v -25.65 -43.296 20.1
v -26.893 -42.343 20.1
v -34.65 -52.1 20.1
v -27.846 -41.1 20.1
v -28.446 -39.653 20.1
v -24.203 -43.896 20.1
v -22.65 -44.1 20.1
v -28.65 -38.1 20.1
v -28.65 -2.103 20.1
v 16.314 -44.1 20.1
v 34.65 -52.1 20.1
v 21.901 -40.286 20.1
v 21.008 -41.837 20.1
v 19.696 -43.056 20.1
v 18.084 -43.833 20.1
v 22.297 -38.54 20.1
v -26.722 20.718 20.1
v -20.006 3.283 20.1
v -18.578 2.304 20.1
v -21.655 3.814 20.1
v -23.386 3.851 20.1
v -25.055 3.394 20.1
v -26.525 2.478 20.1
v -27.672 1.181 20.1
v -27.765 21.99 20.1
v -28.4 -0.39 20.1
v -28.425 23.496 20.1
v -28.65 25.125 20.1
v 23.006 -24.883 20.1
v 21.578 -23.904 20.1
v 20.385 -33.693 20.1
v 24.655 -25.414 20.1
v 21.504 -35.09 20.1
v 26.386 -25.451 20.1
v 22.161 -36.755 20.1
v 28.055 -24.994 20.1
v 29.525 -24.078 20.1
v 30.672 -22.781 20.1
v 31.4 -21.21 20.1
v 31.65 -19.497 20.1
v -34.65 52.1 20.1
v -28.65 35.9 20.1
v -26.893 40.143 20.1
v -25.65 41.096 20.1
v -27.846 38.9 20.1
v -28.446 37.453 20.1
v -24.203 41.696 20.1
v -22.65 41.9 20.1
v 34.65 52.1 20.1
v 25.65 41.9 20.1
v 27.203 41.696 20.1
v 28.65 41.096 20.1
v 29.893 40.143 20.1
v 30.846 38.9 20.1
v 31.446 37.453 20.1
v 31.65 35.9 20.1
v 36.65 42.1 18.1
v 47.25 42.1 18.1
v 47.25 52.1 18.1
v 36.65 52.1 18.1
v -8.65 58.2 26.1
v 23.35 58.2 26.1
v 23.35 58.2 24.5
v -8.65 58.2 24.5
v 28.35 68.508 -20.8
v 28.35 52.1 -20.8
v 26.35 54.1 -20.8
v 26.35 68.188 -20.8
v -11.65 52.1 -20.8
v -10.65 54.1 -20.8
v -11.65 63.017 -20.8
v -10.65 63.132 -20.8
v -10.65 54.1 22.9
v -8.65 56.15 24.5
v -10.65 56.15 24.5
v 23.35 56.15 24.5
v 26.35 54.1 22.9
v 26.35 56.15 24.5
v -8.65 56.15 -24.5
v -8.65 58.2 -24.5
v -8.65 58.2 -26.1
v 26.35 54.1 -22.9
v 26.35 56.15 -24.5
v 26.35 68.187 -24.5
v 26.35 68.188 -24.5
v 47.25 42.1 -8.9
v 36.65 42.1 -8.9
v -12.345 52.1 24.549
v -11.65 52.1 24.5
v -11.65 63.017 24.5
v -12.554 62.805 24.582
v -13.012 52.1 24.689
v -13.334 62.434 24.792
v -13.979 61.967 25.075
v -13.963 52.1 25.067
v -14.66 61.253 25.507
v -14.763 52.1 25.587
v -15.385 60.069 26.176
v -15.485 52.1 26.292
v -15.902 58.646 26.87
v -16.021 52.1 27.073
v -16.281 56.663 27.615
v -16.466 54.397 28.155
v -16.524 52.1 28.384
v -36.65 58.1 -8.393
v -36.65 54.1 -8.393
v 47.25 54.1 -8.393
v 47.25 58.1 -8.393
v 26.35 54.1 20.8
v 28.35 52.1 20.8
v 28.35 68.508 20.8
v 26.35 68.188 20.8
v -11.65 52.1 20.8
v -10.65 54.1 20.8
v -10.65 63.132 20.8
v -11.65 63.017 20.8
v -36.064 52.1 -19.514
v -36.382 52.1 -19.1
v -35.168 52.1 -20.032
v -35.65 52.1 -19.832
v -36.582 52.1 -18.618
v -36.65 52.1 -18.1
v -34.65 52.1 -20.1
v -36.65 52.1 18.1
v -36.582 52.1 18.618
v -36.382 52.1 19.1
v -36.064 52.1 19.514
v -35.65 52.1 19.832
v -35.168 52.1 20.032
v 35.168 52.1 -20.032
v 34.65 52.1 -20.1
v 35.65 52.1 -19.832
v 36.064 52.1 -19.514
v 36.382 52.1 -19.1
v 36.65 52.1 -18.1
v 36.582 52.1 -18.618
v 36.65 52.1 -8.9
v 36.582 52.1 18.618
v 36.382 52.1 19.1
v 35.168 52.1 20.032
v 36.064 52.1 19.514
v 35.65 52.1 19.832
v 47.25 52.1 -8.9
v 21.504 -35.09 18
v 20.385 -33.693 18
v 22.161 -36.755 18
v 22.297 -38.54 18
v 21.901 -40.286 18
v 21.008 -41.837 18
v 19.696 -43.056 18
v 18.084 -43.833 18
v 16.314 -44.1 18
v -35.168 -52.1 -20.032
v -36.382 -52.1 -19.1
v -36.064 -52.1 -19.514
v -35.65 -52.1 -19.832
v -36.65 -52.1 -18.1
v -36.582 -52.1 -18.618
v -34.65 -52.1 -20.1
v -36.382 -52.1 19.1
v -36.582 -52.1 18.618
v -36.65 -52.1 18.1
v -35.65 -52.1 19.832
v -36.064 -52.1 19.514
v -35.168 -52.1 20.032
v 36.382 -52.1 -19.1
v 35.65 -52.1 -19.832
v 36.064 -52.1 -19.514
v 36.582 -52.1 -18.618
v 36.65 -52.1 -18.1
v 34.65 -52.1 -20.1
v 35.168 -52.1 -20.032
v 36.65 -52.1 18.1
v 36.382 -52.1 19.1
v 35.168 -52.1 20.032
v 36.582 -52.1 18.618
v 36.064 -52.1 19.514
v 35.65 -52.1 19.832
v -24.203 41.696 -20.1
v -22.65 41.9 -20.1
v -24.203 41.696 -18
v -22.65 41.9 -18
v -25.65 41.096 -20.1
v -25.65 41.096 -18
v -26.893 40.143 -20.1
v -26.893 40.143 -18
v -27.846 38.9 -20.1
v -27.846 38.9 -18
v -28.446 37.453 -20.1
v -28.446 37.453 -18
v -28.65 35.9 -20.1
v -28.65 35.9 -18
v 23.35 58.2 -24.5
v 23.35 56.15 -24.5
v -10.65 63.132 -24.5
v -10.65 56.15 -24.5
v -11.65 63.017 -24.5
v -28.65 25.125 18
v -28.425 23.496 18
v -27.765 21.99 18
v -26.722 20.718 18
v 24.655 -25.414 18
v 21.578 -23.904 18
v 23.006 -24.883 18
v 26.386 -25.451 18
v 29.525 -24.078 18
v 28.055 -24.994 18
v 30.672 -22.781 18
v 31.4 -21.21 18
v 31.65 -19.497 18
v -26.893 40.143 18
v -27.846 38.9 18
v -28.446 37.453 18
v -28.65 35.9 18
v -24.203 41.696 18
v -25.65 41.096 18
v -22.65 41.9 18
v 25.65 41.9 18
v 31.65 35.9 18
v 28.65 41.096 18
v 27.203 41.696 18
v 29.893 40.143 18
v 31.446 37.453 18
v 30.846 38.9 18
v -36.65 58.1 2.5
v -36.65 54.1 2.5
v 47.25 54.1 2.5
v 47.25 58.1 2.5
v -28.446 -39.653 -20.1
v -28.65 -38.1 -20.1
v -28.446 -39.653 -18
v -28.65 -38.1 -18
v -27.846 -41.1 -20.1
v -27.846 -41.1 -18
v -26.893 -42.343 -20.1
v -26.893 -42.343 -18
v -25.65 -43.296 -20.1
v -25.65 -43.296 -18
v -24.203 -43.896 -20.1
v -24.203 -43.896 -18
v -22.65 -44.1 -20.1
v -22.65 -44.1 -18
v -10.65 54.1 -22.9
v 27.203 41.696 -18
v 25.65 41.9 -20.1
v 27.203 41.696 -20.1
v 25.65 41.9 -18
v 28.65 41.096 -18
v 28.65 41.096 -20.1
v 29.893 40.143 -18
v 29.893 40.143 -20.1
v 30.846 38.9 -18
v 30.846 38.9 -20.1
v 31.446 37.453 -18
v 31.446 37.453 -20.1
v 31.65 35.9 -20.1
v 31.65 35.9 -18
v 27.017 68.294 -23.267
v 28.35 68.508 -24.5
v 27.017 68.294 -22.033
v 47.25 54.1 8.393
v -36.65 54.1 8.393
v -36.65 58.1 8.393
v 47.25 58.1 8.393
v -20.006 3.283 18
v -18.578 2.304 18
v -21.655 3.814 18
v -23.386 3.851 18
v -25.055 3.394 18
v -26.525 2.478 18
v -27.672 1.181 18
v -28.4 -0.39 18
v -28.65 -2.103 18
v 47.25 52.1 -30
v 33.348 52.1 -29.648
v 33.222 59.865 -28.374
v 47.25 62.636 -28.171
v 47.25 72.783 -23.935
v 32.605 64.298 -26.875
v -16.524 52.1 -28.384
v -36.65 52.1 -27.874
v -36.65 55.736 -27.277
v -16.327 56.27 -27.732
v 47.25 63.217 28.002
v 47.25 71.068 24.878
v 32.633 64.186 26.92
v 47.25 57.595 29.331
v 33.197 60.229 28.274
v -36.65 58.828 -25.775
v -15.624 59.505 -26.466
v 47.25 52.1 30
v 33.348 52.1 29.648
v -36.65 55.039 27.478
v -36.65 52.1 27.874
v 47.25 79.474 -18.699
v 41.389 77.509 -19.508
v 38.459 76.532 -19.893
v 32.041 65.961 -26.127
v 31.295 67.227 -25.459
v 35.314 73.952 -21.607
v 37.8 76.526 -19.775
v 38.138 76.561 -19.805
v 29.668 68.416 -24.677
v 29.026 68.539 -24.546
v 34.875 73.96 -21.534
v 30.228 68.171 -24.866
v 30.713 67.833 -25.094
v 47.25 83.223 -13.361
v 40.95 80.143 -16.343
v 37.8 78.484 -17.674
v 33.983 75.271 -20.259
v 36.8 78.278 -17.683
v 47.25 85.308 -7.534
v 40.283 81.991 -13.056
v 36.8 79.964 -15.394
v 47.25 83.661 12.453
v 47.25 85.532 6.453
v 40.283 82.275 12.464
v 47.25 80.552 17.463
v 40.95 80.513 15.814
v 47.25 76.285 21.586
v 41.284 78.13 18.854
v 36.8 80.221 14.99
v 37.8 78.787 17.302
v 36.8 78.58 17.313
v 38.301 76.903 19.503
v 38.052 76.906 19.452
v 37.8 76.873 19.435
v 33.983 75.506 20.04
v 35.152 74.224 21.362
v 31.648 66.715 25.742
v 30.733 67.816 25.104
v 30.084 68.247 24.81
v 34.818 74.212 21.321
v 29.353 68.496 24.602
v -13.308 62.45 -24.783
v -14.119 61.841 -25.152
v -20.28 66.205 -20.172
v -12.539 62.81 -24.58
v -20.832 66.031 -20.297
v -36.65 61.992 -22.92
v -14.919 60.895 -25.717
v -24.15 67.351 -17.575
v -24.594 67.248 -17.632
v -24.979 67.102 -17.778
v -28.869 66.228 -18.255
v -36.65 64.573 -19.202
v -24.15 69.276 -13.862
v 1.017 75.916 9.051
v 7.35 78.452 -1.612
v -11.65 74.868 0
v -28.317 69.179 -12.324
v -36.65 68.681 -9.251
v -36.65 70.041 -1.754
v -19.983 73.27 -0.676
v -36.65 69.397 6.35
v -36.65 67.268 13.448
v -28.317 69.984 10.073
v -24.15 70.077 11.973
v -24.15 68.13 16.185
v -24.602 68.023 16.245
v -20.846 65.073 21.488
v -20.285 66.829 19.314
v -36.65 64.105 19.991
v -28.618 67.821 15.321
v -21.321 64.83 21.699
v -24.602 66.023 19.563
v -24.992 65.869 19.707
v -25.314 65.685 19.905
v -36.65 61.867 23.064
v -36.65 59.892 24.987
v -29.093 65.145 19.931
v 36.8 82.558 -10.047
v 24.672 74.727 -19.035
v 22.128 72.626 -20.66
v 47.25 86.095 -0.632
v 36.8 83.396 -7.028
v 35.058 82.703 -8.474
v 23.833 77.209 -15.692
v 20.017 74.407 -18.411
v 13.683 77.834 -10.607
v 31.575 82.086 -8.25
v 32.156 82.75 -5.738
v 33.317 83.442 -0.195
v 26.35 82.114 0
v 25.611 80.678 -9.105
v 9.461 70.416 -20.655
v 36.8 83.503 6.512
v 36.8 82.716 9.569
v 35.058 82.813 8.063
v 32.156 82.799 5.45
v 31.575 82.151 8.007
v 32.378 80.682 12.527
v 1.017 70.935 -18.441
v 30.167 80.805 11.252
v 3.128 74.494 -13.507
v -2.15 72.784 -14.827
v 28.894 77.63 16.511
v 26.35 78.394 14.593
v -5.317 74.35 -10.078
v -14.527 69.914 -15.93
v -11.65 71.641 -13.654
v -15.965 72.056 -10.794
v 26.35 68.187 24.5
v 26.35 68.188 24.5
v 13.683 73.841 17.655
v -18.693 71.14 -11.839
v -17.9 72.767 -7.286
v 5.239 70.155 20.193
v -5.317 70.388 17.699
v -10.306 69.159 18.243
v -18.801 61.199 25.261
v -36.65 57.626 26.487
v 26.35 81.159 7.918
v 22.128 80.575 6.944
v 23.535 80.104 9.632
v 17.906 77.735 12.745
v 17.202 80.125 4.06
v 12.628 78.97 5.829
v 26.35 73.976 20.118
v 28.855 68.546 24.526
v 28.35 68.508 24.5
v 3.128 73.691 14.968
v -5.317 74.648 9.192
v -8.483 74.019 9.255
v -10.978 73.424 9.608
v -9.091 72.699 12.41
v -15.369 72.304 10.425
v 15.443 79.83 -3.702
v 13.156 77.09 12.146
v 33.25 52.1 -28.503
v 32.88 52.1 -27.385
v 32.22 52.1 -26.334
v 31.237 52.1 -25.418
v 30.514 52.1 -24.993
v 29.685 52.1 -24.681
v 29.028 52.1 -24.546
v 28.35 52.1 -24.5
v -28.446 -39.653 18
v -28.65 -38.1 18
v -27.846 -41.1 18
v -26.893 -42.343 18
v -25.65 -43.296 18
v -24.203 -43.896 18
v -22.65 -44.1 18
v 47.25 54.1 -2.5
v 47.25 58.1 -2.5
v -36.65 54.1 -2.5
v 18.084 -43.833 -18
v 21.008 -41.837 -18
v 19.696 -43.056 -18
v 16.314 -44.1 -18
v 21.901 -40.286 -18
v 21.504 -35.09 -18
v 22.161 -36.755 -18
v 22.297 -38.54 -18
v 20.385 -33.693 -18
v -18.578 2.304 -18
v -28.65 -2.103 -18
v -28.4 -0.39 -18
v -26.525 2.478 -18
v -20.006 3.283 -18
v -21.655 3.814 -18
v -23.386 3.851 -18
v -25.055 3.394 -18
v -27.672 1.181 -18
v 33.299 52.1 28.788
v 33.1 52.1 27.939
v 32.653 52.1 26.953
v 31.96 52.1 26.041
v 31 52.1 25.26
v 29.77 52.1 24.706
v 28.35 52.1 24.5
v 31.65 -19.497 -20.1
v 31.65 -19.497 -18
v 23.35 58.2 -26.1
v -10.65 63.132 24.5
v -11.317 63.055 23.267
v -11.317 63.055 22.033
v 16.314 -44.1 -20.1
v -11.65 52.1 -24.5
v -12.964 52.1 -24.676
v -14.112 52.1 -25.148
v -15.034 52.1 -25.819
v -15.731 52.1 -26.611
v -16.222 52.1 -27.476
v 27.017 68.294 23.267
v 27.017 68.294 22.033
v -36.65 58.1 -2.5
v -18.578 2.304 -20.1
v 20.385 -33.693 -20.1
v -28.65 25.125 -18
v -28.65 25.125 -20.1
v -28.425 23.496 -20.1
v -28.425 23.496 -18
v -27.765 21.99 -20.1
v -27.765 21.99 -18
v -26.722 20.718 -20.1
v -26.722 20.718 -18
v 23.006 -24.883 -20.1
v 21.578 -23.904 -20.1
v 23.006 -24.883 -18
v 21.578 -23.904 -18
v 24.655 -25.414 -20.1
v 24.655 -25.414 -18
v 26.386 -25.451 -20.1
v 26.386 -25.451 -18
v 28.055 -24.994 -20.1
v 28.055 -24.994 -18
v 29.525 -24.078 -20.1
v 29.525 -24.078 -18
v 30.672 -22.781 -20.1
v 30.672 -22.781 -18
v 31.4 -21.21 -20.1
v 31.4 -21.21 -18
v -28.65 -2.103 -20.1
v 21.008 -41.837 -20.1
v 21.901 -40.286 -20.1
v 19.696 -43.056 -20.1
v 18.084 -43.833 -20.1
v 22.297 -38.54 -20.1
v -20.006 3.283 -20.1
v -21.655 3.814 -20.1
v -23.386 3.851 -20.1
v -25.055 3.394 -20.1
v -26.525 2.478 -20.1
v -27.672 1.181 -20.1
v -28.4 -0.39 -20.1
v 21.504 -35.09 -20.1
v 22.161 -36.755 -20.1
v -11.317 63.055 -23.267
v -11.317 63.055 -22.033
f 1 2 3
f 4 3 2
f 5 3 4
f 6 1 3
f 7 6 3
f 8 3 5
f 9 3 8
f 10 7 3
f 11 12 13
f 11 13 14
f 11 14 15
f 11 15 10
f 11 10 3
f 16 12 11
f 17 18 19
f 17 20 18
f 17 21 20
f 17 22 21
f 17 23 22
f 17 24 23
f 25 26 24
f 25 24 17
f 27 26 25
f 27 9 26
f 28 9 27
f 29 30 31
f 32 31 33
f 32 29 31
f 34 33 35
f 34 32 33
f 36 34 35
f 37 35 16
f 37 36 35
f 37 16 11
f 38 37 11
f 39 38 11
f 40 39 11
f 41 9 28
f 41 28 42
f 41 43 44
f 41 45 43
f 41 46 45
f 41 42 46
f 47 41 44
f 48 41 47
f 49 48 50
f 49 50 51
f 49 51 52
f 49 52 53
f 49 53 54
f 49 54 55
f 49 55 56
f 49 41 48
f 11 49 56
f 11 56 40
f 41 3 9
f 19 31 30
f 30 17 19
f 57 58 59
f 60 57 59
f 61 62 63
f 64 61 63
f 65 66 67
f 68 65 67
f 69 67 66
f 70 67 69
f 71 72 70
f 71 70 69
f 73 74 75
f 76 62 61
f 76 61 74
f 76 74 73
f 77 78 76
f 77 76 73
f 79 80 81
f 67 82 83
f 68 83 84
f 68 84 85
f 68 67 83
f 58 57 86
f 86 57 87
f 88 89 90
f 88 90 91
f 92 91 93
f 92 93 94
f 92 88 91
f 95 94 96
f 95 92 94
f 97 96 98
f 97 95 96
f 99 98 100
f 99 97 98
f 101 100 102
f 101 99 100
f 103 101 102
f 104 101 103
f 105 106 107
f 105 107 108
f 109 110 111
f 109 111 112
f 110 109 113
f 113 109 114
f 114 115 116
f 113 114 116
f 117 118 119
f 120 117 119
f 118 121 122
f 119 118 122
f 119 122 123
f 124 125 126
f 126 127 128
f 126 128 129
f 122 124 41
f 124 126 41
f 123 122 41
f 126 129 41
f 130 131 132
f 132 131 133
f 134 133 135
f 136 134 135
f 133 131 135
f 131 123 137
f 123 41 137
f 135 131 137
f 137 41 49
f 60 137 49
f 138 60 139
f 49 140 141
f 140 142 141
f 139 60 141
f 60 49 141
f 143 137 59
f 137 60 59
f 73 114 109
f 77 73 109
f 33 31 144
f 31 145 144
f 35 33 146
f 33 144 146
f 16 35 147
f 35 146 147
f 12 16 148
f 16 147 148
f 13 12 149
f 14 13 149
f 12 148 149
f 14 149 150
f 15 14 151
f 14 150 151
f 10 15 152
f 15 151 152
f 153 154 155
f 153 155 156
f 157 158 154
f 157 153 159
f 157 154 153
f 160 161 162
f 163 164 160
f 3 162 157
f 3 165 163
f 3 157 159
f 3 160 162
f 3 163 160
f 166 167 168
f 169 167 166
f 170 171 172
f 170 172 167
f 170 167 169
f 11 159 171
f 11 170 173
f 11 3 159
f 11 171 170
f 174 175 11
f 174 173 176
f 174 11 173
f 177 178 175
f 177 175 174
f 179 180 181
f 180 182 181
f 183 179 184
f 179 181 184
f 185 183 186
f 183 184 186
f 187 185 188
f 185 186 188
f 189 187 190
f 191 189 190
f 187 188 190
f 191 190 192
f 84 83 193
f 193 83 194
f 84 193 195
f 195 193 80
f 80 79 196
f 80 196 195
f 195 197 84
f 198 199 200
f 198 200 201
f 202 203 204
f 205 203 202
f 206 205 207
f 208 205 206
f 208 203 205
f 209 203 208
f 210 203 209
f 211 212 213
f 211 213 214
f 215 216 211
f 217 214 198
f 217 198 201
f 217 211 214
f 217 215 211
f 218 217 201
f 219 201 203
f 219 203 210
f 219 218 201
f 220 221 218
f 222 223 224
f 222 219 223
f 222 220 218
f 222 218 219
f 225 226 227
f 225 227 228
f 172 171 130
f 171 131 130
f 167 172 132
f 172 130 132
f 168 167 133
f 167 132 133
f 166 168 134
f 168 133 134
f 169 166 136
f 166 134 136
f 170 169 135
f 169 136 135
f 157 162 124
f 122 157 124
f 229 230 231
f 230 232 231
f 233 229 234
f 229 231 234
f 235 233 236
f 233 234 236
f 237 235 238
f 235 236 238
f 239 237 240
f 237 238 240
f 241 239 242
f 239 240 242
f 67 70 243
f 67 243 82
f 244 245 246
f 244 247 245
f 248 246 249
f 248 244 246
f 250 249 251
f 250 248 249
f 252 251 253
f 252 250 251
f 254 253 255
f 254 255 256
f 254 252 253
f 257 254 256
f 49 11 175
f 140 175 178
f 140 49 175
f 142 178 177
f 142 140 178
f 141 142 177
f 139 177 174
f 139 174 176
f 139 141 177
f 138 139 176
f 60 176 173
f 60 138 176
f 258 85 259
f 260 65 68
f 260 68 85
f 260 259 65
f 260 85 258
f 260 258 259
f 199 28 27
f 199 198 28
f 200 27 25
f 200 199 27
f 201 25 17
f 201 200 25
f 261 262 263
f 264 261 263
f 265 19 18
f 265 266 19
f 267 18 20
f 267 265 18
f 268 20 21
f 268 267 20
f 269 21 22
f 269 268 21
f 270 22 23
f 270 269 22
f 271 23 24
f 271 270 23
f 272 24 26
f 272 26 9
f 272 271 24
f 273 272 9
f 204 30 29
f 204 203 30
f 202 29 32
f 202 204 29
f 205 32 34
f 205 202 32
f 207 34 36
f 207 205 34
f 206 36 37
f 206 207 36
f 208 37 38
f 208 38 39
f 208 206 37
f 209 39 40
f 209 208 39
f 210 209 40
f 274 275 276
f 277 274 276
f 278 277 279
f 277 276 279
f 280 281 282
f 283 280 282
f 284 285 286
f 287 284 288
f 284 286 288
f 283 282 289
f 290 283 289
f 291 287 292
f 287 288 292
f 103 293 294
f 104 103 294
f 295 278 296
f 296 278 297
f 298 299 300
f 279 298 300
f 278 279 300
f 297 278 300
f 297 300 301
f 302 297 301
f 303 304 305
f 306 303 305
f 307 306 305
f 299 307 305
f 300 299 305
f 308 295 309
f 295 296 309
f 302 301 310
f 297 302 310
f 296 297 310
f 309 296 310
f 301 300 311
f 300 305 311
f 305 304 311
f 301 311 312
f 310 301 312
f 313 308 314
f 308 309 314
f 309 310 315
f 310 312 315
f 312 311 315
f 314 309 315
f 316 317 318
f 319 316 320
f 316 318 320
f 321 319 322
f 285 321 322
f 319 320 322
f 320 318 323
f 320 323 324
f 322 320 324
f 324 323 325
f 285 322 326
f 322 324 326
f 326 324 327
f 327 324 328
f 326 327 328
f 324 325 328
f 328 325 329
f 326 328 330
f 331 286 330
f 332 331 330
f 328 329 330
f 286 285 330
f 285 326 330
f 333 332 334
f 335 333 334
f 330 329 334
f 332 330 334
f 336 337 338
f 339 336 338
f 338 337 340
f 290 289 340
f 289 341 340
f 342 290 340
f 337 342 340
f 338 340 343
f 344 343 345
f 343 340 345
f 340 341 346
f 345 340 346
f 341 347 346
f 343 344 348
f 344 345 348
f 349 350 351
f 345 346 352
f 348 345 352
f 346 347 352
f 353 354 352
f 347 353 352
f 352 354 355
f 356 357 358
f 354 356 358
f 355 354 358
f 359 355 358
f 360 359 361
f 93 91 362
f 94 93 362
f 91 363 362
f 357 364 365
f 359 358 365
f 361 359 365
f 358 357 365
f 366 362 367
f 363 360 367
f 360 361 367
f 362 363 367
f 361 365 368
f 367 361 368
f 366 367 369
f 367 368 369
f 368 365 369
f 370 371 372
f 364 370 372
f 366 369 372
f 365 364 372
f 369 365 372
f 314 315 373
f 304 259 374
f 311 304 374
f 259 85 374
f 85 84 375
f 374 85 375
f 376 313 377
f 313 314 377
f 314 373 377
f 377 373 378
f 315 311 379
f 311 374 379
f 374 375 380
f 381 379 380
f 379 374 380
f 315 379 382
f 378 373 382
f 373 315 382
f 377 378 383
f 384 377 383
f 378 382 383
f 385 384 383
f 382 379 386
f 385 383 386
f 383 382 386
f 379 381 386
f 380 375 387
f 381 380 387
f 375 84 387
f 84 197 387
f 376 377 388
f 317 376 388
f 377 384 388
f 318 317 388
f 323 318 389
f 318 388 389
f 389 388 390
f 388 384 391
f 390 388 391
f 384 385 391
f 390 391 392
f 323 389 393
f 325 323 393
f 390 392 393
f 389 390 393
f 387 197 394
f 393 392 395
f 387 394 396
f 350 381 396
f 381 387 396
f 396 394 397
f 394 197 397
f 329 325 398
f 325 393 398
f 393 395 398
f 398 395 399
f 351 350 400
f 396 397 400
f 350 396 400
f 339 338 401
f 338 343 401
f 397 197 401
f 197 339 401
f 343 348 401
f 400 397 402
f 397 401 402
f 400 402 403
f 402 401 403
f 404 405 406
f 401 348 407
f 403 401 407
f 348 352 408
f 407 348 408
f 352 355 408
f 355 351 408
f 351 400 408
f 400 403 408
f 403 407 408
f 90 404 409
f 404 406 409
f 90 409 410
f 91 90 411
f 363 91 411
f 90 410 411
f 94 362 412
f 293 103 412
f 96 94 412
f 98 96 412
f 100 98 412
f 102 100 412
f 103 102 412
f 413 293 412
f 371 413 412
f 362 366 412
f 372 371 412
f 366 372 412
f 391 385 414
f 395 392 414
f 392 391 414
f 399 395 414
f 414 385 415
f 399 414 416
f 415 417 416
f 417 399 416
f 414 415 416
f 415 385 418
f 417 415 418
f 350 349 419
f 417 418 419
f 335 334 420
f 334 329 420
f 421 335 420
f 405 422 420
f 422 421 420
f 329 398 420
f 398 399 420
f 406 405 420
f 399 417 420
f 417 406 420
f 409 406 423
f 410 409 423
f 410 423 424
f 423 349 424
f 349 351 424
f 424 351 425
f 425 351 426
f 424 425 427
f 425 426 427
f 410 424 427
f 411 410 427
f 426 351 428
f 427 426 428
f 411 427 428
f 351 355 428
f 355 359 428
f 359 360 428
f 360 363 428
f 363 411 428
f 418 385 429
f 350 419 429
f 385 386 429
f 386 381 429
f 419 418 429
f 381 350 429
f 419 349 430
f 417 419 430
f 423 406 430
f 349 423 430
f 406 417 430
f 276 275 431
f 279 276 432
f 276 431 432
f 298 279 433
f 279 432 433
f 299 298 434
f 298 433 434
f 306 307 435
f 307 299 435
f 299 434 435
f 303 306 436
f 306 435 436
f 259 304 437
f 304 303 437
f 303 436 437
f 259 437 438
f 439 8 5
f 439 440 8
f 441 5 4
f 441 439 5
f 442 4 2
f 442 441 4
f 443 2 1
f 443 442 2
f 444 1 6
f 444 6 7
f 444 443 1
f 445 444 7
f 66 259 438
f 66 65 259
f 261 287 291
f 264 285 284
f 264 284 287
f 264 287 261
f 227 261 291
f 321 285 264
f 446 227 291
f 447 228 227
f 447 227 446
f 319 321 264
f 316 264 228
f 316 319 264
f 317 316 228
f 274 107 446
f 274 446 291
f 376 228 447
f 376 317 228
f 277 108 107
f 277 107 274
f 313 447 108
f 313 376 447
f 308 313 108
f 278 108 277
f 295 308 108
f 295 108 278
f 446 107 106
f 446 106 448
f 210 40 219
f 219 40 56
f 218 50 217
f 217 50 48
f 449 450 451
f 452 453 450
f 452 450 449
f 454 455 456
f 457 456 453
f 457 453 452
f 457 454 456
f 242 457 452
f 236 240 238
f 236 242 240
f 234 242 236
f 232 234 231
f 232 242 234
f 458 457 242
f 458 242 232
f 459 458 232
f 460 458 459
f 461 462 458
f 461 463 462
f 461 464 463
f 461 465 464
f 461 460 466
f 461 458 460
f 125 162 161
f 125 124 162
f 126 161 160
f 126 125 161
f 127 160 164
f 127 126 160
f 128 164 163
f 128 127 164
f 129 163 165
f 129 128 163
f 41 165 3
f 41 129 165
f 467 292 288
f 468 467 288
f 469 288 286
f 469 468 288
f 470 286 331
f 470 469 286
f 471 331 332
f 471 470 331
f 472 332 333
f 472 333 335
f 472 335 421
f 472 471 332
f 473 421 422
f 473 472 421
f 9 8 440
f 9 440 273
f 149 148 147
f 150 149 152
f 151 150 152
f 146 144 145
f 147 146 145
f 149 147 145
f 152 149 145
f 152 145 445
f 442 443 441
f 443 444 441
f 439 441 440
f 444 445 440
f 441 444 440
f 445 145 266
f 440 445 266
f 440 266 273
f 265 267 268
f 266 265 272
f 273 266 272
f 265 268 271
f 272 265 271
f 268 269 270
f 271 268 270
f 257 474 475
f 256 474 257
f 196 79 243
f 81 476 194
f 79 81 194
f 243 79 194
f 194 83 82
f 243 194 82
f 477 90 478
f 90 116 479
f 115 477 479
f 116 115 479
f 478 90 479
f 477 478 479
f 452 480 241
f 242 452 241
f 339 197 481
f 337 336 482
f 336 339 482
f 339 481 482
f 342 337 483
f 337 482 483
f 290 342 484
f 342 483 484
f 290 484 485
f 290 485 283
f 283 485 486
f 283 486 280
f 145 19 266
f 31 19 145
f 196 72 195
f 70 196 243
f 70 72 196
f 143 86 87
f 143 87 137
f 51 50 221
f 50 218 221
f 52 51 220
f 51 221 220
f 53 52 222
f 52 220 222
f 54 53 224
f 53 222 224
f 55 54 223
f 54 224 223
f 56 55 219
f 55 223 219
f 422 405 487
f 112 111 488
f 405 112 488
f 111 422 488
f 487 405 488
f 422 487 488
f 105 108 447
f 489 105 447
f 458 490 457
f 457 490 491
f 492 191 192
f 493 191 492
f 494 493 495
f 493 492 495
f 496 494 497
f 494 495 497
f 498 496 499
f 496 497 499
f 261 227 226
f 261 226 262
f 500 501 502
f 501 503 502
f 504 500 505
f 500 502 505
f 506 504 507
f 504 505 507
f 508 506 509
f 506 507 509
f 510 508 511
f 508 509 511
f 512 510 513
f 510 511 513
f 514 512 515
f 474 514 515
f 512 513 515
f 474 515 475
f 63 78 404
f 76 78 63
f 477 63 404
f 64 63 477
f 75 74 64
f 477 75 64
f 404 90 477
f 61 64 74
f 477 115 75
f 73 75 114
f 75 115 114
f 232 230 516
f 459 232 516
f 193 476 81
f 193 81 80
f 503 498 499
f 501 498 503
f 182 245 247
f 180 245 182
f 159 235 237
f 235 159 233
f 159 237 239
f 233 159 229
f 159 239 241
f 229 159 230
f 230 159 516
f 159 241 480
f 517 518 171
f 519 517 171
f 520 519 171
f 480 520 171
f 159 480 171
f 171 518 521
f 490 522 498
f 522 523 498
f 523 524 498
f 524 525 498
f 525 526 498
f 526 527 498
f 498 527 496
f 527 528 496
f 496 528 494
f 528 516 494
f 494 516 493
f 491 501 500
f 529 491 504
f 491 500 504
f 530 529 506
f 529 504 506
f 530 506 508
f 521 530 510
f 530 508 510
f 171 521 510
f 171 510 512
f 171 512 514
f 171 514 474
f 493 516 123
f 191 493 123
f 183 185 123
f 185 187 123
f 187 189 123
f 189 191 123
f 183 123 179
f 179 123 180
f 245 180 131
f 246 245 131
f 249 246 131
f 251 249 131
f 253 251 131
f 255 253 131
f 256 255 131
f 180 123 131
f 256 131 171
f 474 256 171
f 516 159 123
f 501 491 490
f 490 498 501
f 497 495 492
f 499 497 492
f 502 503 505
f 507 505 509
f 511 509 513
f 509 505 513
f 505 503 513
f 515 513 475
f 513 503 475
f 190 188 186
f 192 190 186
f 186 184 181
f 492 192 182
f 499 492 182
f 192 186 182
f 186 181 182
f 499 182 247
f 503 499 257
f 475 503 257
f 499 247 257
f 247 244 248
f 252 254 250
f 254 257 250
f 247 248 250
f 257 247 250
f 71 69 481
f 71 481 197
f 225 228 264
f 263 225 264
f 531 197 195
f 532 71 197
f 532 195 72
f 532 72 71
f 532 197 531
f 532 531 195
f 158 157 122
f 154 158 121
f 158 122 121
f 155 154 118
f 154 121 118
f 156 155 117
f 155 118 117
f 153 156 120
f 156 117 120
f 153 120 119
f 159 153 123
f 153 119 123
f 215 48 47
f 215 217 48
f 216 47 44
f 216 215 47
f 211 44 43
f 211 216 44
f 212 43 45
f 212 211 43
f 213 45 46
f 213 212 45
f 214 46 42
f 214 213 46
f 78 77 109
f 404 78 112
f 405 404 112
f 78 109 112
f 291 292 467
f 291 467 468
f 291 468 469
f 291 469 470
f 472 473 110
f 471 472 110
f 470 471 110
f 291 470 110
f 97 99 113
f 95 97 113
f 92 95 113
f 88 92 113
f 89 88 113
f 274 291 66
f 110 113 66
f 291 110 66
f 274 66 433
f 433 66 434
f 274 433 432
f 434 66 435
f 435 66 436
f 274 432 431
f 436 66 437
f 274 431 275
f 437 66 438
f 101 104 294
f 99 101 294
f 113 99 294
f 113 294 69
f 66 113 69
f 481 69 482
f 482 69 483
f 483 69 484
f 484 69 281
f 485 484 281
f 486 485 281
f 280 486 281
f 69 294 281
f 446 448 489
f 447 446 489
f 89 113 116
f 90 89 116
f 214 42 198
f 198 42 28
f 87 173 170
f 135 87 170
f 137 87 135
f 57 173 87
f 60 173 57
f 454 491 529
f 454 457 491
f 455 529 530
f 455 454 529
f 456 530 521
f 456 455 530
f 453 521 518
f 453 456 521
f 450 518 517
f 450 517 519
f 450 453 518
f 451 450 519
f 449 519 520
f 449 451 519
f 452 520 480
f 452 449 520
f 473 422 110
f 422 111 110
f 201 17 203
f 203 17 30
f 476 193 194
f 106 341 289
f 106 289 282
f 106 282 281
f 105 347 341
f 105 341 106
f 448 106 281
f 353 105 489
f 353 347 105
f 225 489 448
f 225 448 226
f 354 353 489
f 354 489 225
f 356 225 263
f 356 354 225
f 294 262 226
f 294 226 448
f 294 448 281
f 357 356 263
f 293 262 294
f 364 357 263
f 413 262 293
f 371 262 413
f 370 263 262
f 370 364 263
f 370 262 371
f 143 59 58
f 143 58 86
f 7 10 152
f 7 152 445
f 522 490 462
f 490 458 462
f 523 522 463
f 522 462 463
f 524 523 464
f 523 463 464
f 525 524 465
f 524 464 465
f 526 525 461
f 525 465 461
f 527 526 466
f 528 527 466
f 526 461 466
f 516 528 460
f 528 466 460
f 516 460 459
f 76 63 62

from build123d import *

# Parameters (mm, degrees)
SKETCH_1_W             = 73.3
SKETCH_1_H             = 104.2
EXTRUDE_1_DEPTH        = 20.1
SKETCH_2_W             = 27
SKETCH_2_H             = 10
EXTRUDE_2_DEPTH        = 10.6
CUT_EXTRUDE_1_DEPTH    = 150.103328411
SKETCH_13_W            = 5.892656798
SKETCH_13_H            = 4
CUT_EXTRUDE_4_DEPTH    = 124.904883035
FILLET_5_R             = 2
CUT_EXTRUDE_5_DEPTH    = 2.1
FILLET_6_R             = 6
FILLET_6_OF_MIRROR_2_R = 6
CUT_EXTRUDE_START      = -3.7
CUT_EXTRUDE_6_DEPTH    = 3.7
EXTRUDE_START          = -3
EXTRUDE_5_DEPTH        = 32
CUT_EXTRUDE_7_DEPTH    = 37


# Read off the part's stored shape, not the designer's step: 切除-拉伸6
with BuildPart() as part:
    # 草图1 → 凸台-拉伸1 (new, symmetric)
    with BuildSketch(Plane.XY):
        Rectangle(SKETCH_1_W, SKETCH_1_H)
    extrude(amount=EXTRUDE_1_DEPTH, both=True)

    # 草图2 → 凸台-拉伸2 (add)
    with BuildSketch(Plane(origin=(36.65, 0, 0), x_dir=(0, 0, -1), z_dir=(1, 0, 0))):
        with Locations((-4.6, 47.1)):
            Rectangle(SKETCH_2_W, SKETCH_2_H)
    extrude(amount=EXTRUDE_2_DEPTH)

    # 圆角5
    fillet_5_edges = [part.edges().sort_by_distance(p)[0] for p in [
        (36.65, 0, 20.1),
        (-36.65, 0, 20.1),
        (-36.65, 0, -20.1),
        (36.65, 0, -20.1),
    ]]
    fillet(fillet_5_edges, radius=FILLET_5_R - 0.0001)  # a hair under: the kernel refuses the full size

    # 草图14 → 切除-拉伸5 (cut)
    with BuildSketch(Plane(origin=(0, 0, -20.1), x_dir=(-1, 0, 0), z_dir=(0, 0, -1))):
        Polygon((-31.65, 41.9), (28.65, 41.9), (28.65, 22.5), (-31.65, -33.208507203), align=None)
        Polygon((-31.65, -44.1), (28.65, -44.1), (28.65, 11.608507203), align=None)
    cut_extrude_5 = extrude(amount=-CUT_EXTRUDE_5_DEPTH, mode=Mode.SUBTRACT)

    # 圆角6
    fillet_6_edges = [part.edges().sort_by_distance(p)[0] for p in [
        (31.65, -33.208507203, -19.05),
        (31.65, 41.9, -19.05),
        (-28.65, 41.9, -19.05),
        (-28.65, 22.5, -19.05),
        (31.65, -44.1, -19.05),
        (-28.65, 11.608507203, -19.05),
        (-28.65, -44.1, -19.05),
    ]]
    fillet(fillet_6_edges, radius=FILLET_6_R)

    # 镜向2: 切除-拉伸5 across plane
    add(cut_extrude_5.mirror(Plane.XY), mode=Mode.SUBTRACT)

    # 圆角6 of 镜向2
    fillet_6_of_mirror_2_edges = [part.edges().sort_by_distance(p)[0] for p in [
        (31.65, -33.208507203, 19.05),
        (31.65, 41.9, 19.05),
        (-28.65, 41.9, 19.05),
        (-28.65, 22.5, 19.05),
        (31.65, -44.1, 19.05),
        (-28.65, 11.608507203, 19.05),
        (-28.65, -44.1, 19.05),
    ]]
    fillet(fillet_6_of_mirror_2_edges, radius=FILLET_6_OF_MIRROR_2_R)


with BuildPart() as body_2:
    # 草图8 → 放样11 section 0
    with BuildSketch(Plane(origin=(47.25, 0, 0), x_dir=(0, 0, -1), z_dir=(1, 0, 0))):
        with BuildLine():
            Line((-30, 52.1), (30, 52.1))
            add(Edge.make_bspline(
                [(0, 86.1), (8.566359437, 86.1), (23.54859031, 79.814309679), (29.414977023, 61.202134763), (30, 52.1)],
                knots=[0, 0, 0, 0, 0.419616758, 1, 1, 1, 1], degree=3))
            add(Edge.make_bspline(
                [(0, 86.1), (-8.566359437, 86.1), (-23.54859031, 79.814309679), (-29.414977023, 61.202134763), (-30, 52.1)],
                knots=[0, 0, 0, 0, 0.419616758, 1, 1, 1, 1], degree=3))
        make_face()
    # 草图9 → 放样11 section 1
    with BuildSketch(Plane.ZY.offset(36.65)):
        with BuildLine():
            Line((-27.873983974, 52.1), (27.873983974, 52.1))
            add(Edge.make_bspline(
                [(0, 70.1), (4.734777204, 70.1), (17.075617158, 66.979270336), (27.707744353, 59.568671532), (27.873983974, 52.1)],
                knots=[0, 0, 0, 0, 0.435513689, 1, 1, 1, 1], degree=3))
            add(Edge.make_bspline(
                [(0, 70.1), (-4.734777204, 70.1), (-17.075617158, 66.979270336), (-27.707744353, 59.568671532), (-27.873983974, 52.1)],
                knots=[0, 0, 0, 0, 0.435513689, 1, 1, 1, 1], degree=3))
        make_face()
    loft()

    # 草图10 → 切除-拉伸1 (cut, through all)
    with BuildSketch(Plane.XZ.offset(52.1)):
        with BuildLine():
            Line((-11.65, 34.5), (28.35, 34.5))
            ThreePointArc((28.35, 34.5), (33.35, 29.5), (28.35, 24.5))
            Line((28.35, 24.5), (-11.65, 24.5))
            ThreePointArc((-11.65, 24.5), (-16.65, 29.5), (-11.65, 34.5))
        make_face()
    cut_extrude_1 = extrude(amount=-CUT_EXTRUDE_1_DEPTH, mode=Mode.SUBTRACT)

    # 镜向1: 切除-拉伸1 across plane
    add(cut_extrude_1.mirror(Plane.XY), mode=Mode.SUBTRACT)

    # 草图13 → 切除-拉伸4 (cut, through all)
    with BuildSketch(Plane.ZY.offset(36.65)):
        with Locations((5.446328399, 56.1)):
            Rectangle(SKETCH_13_W, SKETCH_13_H)
        with Locations((-5.446328399, 56.1)):
            Rectangle(SKETCH_13_W, SKETCH_13_H)
    extrude(amount=-CUT_EXTRUDE_4_DEPTH, mode=Mode.SUBTRACT)

    # 切除-拉伸6 outline → 切除-拉伸6 (cut)
    with BuildSketch(Plane(origin=(0, 0, -24.5), x_dir=(-1, 0, 0), z_dir=(0, 0, -1)).offset(CUT_EXTRUDE_START)):
        with BuildLine():
            Line((11.65, 52.1), (11.65, 63.016574647))
            add(Edge.make_bspline(
                [(11.65, 63.016574647), (11.316642702, 63.054787825), (10.983309337, 63.093175333), (10.65000001, 63.131737945)],
                knots=[0, 0, 0, 0, 0.024925497, 0.024925497, 0.024925497, 0.024925497], degree=3))
            Line((10.65000001, 63.131737945), (10.65, 54.1))
            Line((10.65, 54.1), (-26.35, 54.1))
            Line((-26.35, 54.1), (-26.349995612, 68.187634584))
            add(Edge.make_bspline(
                [(-26.349995612, 68.187634584), (-27.016777374, 68.29352852), (-27.683445793, 68.400248086), (-28.35, 68.507799608)],
                knots=[0.949846275, 0.949846275, 0.949846275, 0.949846275, 1, 1, 1, 1], degree=3))
            Line((-28.35, 68.507799608), (-28.35, 52.1))
            Line((-28.35, 52.1), (11.65, 52.1))
        make_face()
    cut_extrude_6 = extrude(amount=CUT_EXTRUDE_6_DEPTH, mode=Mode.SUBTRACT)

    # 草图18 → 凸台-拉伸5 (add)
    with BuildSketch(Plane(origin=(26.35, 0, 0), x_dir=(0, 0, -1), z_dir=(1, 0, 0)).offset(EXTRUDE_START)):
        Polygon((24.5, 58.2), (24.5, 56.15), (26.1, 58.2), align=None)
    extrude_5 = extrude(amount=-EXTRUDE_5_DEPTH)

    # 草图18<3> → 切除-拉伸7 (cut)
    with BuildSketch(Plane(origin=(26.35, 0, 0), x_dir=(0, 0, -1), z_dir=(1, 0, 0))):
        Polygon((22.9, 54.1), (24.5, 54.1), (24.5, 56.15), align=None)
    cut_extrude_7 = extrude(amount=-CUT_EXTRUDE_7_DEPTH, mode=Mode.SUBTRACT)

    # 镜向3: 切除-拉伸6, 凸台-拉伸5, 切除-拉伸7 across plane
    add(cut_extrude_6.mirror(Plane.XY), mode=Mode.SUBTRACT)
    add(extrude_5.mirror(Plane.XY))
    add(cut_extrude_7.mirror(Plane.XY), mode=Mode.SUBTRACT)


solid = Compound([part.part, body_2.part])
